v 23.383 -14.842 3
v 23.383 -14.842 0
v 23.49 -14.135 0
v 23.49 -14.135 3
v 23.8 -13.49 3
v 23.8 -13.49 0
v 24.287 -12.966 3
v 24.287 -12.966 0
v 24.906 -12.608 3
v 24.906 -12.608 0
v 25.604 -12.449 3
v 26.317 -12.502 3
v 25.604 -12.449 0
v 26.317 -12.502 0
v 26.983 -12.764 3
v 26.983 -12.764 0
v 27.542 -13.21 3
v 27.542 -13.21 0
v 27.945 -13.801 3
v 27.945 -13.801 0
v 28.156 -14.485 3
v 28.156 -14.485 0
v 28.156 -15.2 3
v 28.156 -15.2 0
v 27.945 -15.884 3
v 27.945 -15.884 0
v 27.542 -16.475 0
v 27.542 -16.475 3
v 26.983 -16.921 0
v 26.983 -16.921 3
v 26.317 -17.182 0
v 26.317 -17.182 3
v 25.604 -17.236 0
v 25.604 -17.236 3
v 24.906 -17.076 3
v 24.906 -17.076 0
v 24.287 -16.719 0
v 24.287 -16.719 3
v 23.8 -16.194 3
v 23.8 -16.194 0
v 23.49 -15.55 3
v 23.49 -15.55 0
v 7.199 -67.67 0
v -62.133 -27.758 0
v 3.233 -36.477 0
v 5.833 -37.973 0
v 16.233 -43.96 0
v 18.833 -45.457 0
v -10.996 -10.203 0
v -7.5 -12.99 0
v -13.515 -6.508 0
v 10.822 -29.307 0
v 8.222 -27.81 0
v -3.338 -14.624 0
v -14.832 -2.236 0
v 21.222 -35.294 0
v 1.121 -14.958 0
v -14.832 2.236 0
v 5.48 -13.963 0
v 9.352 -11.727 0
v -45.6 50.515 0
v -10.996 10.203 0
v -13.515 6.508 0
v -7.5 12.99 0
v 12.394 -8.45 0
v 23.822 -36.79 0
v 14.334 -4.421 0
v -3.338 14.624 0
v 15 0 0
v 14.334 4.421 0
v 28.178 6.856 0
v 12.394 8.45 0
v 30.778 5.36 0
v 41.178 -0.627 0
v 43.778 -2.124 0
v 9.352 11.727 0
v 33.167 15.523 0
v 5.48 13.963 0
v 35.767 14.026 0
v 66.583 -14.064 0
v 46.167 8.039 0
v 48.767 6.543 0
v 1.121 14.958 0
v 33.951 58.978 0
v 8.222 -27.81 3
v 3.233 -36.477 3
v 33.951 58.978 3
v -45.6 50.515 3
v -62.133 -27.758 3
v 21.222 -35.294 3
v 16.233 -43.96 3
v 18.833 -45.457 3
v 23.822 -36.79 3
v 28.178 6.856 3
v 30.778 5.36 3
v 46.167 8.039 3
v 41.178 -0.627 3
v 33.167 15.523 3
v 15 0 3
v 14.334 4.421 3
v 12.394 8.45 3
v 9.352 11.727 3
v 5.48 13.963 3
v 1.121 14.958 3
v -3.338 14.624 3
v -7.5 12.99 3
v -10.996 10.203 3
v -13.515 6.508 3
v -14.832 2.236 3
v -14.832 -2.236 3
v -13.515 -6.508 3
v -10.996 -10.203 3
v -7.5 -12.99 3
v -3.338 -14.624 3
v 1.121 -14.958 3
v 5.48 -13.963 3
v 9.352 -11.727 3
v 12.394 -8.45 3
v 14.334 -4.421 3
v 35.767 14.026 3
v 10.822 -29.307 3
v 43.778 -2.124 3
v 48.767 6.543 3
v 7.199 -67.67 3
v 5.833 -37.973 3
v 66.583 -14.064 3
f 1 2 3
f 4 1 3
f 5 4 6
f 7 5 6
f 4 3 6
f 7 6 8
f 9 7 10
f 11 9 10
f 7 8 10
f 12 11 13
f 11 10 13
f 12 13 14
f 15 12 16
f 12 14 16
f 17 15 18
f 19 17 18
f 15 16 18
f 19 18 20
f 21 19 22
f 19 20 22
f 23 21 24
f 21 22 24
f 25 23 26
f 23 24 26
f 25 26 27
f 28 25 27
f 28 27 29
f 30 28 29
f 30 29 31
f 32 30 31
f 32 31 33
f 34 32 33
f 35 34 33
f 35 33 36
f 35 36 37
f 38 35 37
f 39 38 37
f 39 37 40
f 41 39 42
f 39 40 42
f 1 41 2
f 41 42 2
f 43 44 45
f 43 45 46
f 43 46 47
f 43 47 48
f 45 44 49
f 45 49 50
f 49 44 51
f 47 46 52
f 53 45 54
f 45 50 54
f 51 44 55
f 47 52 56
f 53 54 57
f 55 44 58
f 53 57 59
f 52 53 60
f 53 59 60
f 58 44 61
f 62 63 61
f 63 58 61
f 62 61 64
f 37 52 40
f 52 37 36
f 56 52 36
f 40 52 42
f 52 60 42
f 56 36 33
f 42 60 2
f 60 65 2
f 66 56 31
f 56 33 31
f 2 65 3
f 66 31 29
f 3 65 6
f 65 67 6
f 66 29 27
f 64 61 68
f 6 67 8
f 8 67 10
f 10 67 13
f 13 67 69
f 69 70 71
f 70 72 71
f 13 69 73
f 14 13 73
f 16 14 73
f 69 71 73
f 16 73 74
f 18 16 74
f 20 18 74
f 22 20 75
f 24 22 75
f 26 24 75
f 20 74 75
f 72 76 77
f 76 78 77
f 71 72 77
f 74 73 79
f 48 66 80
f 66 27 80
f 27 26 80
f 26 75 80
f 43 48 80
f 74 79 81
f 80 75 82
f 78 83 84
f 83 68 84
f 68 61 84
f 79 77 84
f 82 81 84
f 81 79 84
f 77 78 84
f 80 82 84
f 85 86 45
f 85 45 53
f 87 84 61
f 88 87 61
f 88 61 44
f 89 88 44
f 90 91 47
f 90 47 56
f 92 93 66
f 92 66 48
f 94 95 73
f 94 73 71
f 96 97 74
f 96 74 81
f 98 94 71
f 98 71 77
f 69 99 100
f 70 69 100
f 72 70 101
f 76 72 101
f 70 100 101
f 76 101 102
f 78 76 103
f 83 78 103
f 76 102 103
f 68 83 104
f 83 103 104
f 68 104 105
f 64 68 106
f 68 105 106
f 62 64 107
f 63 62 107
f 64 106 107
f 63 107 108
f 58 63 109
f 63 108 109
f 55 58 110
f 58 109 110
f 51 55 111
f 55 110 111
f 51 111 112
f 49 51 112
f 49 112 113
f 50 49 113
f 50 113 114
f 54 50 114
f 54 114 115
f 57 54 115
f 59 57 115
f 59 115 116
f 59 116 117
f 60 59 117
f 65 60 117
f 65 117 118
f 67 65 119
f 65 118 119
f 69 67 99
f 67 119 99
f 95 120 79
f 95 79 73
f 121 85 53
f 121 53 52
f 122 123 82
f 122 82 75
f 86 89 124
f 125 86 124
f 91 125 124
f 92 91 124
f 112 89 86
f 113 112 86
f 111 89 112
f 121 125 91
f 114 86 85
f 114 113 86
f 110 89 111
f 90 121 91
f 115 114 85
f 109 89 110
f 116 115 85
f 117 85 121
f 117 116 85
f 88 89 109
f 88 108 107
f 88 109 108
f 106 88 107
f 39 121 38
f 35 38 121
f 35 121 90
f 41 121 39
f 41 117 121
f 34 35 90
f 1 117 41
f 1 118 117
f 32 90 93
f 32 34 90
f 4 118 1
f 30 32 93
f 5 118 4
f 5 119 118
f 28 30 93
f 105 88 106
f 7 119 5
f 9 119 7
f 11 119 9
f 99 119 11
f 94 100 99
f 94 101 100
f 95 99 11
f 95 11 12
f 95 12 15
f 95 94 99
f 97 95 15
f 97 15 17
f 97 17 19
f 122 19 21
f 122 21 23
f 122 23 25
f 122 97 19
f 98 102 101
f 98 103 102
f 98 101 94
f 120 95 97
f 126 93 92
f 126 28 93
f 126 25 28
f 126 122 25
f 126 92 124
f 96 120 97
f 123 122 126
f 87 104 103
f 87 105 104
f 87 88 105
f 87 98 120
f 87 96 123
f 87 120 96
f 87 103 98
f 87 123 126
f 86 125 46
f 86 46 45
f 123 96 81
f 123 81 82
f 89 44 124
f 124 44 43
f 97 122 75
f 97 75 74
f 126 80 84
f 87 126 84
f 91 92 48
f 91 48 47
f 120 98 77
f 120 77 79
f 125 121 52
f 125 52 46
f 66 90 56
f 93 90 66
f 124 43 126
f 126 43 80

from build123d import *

# Parameters (mm, degrees)
BOSS_EXTRUDE1_DEPTH = 3
SKETCH3_R           = 15
CUT_EXTRUDE1_DEPTH  = 3
CUT_EXTRUDE3_DEPTH  = 3
SKETCH7_R           = 2.4
CUT_EXTRUDE4_DEPTH  = 3


with BuildPart() as part:
    # Sketch1 → Boss-Extrude1 (new body)
    with BuildSketch(Plane.XY):
        Polygon((-62.133450379, -27.758203286), (7.199328029, -67.670179411), (66.582879797, -14.064267615), (33.951154754, 58.977983998), (-45.599912202, 50.514666314), align=None)
    extrude(amount=BOSS_EXTRUDE1_DEPTH)

    # Sketch3 → Cut-Extrude1 (cut)
    with BuildSketch(Plane.XY.offset(3)):
        Circle(SKETCH3_R)
    extrude(amount=-CUT_EXTRUDE1_DEPTH, mode=Mode.SUBTRACT)

    # Sketch5 → Cut-Extrude3 (cut)
    with BuildSketch(Plane.XY.offset(3)):
        Polygon((28.177848363, 6.856300869), (33.166845379, 15.52289817), (35.766824569, 14.026199065), (30.777827554, 5.359601764), align=None)
        Polygon((41.177744315, -0.627194654), (46.166741331, 8.039402647), (48.766720521, 6.542703542), (43.777723505, -2.123893759), align=None)
        Polygon((10.821839491, -29.30678744), (5.832842475, -37.973384741), (3.232863285, -36.476685636), (8.221860301, -27.810088335), align=None)
        Polygon((23.821735443, -36.790282963), (18.832738427, -45.456880264), (16.232759237, -43.960181159), (21.221756252, -35.293583858), align=None)
    extrude(amount=-CUT_EXTRUDE3_DEPTH, mode=Mode.SUBTRACT)

    # Sketch7 → Cut-Extrude4 (cut)
    with BuildSketch(Plane(origin=(0, 0, 0), x_dir=(-1, 0, 0), z_dir=(0, 0, -1))):
        with Locations((-25.78312697, -14.842266122)):
            Circle(SKETCH7_R)
    extrude(amount=-CUT_EXTRUDE4_DEPTH, mode=Mode.SUBTRACT)


solid = part.part
